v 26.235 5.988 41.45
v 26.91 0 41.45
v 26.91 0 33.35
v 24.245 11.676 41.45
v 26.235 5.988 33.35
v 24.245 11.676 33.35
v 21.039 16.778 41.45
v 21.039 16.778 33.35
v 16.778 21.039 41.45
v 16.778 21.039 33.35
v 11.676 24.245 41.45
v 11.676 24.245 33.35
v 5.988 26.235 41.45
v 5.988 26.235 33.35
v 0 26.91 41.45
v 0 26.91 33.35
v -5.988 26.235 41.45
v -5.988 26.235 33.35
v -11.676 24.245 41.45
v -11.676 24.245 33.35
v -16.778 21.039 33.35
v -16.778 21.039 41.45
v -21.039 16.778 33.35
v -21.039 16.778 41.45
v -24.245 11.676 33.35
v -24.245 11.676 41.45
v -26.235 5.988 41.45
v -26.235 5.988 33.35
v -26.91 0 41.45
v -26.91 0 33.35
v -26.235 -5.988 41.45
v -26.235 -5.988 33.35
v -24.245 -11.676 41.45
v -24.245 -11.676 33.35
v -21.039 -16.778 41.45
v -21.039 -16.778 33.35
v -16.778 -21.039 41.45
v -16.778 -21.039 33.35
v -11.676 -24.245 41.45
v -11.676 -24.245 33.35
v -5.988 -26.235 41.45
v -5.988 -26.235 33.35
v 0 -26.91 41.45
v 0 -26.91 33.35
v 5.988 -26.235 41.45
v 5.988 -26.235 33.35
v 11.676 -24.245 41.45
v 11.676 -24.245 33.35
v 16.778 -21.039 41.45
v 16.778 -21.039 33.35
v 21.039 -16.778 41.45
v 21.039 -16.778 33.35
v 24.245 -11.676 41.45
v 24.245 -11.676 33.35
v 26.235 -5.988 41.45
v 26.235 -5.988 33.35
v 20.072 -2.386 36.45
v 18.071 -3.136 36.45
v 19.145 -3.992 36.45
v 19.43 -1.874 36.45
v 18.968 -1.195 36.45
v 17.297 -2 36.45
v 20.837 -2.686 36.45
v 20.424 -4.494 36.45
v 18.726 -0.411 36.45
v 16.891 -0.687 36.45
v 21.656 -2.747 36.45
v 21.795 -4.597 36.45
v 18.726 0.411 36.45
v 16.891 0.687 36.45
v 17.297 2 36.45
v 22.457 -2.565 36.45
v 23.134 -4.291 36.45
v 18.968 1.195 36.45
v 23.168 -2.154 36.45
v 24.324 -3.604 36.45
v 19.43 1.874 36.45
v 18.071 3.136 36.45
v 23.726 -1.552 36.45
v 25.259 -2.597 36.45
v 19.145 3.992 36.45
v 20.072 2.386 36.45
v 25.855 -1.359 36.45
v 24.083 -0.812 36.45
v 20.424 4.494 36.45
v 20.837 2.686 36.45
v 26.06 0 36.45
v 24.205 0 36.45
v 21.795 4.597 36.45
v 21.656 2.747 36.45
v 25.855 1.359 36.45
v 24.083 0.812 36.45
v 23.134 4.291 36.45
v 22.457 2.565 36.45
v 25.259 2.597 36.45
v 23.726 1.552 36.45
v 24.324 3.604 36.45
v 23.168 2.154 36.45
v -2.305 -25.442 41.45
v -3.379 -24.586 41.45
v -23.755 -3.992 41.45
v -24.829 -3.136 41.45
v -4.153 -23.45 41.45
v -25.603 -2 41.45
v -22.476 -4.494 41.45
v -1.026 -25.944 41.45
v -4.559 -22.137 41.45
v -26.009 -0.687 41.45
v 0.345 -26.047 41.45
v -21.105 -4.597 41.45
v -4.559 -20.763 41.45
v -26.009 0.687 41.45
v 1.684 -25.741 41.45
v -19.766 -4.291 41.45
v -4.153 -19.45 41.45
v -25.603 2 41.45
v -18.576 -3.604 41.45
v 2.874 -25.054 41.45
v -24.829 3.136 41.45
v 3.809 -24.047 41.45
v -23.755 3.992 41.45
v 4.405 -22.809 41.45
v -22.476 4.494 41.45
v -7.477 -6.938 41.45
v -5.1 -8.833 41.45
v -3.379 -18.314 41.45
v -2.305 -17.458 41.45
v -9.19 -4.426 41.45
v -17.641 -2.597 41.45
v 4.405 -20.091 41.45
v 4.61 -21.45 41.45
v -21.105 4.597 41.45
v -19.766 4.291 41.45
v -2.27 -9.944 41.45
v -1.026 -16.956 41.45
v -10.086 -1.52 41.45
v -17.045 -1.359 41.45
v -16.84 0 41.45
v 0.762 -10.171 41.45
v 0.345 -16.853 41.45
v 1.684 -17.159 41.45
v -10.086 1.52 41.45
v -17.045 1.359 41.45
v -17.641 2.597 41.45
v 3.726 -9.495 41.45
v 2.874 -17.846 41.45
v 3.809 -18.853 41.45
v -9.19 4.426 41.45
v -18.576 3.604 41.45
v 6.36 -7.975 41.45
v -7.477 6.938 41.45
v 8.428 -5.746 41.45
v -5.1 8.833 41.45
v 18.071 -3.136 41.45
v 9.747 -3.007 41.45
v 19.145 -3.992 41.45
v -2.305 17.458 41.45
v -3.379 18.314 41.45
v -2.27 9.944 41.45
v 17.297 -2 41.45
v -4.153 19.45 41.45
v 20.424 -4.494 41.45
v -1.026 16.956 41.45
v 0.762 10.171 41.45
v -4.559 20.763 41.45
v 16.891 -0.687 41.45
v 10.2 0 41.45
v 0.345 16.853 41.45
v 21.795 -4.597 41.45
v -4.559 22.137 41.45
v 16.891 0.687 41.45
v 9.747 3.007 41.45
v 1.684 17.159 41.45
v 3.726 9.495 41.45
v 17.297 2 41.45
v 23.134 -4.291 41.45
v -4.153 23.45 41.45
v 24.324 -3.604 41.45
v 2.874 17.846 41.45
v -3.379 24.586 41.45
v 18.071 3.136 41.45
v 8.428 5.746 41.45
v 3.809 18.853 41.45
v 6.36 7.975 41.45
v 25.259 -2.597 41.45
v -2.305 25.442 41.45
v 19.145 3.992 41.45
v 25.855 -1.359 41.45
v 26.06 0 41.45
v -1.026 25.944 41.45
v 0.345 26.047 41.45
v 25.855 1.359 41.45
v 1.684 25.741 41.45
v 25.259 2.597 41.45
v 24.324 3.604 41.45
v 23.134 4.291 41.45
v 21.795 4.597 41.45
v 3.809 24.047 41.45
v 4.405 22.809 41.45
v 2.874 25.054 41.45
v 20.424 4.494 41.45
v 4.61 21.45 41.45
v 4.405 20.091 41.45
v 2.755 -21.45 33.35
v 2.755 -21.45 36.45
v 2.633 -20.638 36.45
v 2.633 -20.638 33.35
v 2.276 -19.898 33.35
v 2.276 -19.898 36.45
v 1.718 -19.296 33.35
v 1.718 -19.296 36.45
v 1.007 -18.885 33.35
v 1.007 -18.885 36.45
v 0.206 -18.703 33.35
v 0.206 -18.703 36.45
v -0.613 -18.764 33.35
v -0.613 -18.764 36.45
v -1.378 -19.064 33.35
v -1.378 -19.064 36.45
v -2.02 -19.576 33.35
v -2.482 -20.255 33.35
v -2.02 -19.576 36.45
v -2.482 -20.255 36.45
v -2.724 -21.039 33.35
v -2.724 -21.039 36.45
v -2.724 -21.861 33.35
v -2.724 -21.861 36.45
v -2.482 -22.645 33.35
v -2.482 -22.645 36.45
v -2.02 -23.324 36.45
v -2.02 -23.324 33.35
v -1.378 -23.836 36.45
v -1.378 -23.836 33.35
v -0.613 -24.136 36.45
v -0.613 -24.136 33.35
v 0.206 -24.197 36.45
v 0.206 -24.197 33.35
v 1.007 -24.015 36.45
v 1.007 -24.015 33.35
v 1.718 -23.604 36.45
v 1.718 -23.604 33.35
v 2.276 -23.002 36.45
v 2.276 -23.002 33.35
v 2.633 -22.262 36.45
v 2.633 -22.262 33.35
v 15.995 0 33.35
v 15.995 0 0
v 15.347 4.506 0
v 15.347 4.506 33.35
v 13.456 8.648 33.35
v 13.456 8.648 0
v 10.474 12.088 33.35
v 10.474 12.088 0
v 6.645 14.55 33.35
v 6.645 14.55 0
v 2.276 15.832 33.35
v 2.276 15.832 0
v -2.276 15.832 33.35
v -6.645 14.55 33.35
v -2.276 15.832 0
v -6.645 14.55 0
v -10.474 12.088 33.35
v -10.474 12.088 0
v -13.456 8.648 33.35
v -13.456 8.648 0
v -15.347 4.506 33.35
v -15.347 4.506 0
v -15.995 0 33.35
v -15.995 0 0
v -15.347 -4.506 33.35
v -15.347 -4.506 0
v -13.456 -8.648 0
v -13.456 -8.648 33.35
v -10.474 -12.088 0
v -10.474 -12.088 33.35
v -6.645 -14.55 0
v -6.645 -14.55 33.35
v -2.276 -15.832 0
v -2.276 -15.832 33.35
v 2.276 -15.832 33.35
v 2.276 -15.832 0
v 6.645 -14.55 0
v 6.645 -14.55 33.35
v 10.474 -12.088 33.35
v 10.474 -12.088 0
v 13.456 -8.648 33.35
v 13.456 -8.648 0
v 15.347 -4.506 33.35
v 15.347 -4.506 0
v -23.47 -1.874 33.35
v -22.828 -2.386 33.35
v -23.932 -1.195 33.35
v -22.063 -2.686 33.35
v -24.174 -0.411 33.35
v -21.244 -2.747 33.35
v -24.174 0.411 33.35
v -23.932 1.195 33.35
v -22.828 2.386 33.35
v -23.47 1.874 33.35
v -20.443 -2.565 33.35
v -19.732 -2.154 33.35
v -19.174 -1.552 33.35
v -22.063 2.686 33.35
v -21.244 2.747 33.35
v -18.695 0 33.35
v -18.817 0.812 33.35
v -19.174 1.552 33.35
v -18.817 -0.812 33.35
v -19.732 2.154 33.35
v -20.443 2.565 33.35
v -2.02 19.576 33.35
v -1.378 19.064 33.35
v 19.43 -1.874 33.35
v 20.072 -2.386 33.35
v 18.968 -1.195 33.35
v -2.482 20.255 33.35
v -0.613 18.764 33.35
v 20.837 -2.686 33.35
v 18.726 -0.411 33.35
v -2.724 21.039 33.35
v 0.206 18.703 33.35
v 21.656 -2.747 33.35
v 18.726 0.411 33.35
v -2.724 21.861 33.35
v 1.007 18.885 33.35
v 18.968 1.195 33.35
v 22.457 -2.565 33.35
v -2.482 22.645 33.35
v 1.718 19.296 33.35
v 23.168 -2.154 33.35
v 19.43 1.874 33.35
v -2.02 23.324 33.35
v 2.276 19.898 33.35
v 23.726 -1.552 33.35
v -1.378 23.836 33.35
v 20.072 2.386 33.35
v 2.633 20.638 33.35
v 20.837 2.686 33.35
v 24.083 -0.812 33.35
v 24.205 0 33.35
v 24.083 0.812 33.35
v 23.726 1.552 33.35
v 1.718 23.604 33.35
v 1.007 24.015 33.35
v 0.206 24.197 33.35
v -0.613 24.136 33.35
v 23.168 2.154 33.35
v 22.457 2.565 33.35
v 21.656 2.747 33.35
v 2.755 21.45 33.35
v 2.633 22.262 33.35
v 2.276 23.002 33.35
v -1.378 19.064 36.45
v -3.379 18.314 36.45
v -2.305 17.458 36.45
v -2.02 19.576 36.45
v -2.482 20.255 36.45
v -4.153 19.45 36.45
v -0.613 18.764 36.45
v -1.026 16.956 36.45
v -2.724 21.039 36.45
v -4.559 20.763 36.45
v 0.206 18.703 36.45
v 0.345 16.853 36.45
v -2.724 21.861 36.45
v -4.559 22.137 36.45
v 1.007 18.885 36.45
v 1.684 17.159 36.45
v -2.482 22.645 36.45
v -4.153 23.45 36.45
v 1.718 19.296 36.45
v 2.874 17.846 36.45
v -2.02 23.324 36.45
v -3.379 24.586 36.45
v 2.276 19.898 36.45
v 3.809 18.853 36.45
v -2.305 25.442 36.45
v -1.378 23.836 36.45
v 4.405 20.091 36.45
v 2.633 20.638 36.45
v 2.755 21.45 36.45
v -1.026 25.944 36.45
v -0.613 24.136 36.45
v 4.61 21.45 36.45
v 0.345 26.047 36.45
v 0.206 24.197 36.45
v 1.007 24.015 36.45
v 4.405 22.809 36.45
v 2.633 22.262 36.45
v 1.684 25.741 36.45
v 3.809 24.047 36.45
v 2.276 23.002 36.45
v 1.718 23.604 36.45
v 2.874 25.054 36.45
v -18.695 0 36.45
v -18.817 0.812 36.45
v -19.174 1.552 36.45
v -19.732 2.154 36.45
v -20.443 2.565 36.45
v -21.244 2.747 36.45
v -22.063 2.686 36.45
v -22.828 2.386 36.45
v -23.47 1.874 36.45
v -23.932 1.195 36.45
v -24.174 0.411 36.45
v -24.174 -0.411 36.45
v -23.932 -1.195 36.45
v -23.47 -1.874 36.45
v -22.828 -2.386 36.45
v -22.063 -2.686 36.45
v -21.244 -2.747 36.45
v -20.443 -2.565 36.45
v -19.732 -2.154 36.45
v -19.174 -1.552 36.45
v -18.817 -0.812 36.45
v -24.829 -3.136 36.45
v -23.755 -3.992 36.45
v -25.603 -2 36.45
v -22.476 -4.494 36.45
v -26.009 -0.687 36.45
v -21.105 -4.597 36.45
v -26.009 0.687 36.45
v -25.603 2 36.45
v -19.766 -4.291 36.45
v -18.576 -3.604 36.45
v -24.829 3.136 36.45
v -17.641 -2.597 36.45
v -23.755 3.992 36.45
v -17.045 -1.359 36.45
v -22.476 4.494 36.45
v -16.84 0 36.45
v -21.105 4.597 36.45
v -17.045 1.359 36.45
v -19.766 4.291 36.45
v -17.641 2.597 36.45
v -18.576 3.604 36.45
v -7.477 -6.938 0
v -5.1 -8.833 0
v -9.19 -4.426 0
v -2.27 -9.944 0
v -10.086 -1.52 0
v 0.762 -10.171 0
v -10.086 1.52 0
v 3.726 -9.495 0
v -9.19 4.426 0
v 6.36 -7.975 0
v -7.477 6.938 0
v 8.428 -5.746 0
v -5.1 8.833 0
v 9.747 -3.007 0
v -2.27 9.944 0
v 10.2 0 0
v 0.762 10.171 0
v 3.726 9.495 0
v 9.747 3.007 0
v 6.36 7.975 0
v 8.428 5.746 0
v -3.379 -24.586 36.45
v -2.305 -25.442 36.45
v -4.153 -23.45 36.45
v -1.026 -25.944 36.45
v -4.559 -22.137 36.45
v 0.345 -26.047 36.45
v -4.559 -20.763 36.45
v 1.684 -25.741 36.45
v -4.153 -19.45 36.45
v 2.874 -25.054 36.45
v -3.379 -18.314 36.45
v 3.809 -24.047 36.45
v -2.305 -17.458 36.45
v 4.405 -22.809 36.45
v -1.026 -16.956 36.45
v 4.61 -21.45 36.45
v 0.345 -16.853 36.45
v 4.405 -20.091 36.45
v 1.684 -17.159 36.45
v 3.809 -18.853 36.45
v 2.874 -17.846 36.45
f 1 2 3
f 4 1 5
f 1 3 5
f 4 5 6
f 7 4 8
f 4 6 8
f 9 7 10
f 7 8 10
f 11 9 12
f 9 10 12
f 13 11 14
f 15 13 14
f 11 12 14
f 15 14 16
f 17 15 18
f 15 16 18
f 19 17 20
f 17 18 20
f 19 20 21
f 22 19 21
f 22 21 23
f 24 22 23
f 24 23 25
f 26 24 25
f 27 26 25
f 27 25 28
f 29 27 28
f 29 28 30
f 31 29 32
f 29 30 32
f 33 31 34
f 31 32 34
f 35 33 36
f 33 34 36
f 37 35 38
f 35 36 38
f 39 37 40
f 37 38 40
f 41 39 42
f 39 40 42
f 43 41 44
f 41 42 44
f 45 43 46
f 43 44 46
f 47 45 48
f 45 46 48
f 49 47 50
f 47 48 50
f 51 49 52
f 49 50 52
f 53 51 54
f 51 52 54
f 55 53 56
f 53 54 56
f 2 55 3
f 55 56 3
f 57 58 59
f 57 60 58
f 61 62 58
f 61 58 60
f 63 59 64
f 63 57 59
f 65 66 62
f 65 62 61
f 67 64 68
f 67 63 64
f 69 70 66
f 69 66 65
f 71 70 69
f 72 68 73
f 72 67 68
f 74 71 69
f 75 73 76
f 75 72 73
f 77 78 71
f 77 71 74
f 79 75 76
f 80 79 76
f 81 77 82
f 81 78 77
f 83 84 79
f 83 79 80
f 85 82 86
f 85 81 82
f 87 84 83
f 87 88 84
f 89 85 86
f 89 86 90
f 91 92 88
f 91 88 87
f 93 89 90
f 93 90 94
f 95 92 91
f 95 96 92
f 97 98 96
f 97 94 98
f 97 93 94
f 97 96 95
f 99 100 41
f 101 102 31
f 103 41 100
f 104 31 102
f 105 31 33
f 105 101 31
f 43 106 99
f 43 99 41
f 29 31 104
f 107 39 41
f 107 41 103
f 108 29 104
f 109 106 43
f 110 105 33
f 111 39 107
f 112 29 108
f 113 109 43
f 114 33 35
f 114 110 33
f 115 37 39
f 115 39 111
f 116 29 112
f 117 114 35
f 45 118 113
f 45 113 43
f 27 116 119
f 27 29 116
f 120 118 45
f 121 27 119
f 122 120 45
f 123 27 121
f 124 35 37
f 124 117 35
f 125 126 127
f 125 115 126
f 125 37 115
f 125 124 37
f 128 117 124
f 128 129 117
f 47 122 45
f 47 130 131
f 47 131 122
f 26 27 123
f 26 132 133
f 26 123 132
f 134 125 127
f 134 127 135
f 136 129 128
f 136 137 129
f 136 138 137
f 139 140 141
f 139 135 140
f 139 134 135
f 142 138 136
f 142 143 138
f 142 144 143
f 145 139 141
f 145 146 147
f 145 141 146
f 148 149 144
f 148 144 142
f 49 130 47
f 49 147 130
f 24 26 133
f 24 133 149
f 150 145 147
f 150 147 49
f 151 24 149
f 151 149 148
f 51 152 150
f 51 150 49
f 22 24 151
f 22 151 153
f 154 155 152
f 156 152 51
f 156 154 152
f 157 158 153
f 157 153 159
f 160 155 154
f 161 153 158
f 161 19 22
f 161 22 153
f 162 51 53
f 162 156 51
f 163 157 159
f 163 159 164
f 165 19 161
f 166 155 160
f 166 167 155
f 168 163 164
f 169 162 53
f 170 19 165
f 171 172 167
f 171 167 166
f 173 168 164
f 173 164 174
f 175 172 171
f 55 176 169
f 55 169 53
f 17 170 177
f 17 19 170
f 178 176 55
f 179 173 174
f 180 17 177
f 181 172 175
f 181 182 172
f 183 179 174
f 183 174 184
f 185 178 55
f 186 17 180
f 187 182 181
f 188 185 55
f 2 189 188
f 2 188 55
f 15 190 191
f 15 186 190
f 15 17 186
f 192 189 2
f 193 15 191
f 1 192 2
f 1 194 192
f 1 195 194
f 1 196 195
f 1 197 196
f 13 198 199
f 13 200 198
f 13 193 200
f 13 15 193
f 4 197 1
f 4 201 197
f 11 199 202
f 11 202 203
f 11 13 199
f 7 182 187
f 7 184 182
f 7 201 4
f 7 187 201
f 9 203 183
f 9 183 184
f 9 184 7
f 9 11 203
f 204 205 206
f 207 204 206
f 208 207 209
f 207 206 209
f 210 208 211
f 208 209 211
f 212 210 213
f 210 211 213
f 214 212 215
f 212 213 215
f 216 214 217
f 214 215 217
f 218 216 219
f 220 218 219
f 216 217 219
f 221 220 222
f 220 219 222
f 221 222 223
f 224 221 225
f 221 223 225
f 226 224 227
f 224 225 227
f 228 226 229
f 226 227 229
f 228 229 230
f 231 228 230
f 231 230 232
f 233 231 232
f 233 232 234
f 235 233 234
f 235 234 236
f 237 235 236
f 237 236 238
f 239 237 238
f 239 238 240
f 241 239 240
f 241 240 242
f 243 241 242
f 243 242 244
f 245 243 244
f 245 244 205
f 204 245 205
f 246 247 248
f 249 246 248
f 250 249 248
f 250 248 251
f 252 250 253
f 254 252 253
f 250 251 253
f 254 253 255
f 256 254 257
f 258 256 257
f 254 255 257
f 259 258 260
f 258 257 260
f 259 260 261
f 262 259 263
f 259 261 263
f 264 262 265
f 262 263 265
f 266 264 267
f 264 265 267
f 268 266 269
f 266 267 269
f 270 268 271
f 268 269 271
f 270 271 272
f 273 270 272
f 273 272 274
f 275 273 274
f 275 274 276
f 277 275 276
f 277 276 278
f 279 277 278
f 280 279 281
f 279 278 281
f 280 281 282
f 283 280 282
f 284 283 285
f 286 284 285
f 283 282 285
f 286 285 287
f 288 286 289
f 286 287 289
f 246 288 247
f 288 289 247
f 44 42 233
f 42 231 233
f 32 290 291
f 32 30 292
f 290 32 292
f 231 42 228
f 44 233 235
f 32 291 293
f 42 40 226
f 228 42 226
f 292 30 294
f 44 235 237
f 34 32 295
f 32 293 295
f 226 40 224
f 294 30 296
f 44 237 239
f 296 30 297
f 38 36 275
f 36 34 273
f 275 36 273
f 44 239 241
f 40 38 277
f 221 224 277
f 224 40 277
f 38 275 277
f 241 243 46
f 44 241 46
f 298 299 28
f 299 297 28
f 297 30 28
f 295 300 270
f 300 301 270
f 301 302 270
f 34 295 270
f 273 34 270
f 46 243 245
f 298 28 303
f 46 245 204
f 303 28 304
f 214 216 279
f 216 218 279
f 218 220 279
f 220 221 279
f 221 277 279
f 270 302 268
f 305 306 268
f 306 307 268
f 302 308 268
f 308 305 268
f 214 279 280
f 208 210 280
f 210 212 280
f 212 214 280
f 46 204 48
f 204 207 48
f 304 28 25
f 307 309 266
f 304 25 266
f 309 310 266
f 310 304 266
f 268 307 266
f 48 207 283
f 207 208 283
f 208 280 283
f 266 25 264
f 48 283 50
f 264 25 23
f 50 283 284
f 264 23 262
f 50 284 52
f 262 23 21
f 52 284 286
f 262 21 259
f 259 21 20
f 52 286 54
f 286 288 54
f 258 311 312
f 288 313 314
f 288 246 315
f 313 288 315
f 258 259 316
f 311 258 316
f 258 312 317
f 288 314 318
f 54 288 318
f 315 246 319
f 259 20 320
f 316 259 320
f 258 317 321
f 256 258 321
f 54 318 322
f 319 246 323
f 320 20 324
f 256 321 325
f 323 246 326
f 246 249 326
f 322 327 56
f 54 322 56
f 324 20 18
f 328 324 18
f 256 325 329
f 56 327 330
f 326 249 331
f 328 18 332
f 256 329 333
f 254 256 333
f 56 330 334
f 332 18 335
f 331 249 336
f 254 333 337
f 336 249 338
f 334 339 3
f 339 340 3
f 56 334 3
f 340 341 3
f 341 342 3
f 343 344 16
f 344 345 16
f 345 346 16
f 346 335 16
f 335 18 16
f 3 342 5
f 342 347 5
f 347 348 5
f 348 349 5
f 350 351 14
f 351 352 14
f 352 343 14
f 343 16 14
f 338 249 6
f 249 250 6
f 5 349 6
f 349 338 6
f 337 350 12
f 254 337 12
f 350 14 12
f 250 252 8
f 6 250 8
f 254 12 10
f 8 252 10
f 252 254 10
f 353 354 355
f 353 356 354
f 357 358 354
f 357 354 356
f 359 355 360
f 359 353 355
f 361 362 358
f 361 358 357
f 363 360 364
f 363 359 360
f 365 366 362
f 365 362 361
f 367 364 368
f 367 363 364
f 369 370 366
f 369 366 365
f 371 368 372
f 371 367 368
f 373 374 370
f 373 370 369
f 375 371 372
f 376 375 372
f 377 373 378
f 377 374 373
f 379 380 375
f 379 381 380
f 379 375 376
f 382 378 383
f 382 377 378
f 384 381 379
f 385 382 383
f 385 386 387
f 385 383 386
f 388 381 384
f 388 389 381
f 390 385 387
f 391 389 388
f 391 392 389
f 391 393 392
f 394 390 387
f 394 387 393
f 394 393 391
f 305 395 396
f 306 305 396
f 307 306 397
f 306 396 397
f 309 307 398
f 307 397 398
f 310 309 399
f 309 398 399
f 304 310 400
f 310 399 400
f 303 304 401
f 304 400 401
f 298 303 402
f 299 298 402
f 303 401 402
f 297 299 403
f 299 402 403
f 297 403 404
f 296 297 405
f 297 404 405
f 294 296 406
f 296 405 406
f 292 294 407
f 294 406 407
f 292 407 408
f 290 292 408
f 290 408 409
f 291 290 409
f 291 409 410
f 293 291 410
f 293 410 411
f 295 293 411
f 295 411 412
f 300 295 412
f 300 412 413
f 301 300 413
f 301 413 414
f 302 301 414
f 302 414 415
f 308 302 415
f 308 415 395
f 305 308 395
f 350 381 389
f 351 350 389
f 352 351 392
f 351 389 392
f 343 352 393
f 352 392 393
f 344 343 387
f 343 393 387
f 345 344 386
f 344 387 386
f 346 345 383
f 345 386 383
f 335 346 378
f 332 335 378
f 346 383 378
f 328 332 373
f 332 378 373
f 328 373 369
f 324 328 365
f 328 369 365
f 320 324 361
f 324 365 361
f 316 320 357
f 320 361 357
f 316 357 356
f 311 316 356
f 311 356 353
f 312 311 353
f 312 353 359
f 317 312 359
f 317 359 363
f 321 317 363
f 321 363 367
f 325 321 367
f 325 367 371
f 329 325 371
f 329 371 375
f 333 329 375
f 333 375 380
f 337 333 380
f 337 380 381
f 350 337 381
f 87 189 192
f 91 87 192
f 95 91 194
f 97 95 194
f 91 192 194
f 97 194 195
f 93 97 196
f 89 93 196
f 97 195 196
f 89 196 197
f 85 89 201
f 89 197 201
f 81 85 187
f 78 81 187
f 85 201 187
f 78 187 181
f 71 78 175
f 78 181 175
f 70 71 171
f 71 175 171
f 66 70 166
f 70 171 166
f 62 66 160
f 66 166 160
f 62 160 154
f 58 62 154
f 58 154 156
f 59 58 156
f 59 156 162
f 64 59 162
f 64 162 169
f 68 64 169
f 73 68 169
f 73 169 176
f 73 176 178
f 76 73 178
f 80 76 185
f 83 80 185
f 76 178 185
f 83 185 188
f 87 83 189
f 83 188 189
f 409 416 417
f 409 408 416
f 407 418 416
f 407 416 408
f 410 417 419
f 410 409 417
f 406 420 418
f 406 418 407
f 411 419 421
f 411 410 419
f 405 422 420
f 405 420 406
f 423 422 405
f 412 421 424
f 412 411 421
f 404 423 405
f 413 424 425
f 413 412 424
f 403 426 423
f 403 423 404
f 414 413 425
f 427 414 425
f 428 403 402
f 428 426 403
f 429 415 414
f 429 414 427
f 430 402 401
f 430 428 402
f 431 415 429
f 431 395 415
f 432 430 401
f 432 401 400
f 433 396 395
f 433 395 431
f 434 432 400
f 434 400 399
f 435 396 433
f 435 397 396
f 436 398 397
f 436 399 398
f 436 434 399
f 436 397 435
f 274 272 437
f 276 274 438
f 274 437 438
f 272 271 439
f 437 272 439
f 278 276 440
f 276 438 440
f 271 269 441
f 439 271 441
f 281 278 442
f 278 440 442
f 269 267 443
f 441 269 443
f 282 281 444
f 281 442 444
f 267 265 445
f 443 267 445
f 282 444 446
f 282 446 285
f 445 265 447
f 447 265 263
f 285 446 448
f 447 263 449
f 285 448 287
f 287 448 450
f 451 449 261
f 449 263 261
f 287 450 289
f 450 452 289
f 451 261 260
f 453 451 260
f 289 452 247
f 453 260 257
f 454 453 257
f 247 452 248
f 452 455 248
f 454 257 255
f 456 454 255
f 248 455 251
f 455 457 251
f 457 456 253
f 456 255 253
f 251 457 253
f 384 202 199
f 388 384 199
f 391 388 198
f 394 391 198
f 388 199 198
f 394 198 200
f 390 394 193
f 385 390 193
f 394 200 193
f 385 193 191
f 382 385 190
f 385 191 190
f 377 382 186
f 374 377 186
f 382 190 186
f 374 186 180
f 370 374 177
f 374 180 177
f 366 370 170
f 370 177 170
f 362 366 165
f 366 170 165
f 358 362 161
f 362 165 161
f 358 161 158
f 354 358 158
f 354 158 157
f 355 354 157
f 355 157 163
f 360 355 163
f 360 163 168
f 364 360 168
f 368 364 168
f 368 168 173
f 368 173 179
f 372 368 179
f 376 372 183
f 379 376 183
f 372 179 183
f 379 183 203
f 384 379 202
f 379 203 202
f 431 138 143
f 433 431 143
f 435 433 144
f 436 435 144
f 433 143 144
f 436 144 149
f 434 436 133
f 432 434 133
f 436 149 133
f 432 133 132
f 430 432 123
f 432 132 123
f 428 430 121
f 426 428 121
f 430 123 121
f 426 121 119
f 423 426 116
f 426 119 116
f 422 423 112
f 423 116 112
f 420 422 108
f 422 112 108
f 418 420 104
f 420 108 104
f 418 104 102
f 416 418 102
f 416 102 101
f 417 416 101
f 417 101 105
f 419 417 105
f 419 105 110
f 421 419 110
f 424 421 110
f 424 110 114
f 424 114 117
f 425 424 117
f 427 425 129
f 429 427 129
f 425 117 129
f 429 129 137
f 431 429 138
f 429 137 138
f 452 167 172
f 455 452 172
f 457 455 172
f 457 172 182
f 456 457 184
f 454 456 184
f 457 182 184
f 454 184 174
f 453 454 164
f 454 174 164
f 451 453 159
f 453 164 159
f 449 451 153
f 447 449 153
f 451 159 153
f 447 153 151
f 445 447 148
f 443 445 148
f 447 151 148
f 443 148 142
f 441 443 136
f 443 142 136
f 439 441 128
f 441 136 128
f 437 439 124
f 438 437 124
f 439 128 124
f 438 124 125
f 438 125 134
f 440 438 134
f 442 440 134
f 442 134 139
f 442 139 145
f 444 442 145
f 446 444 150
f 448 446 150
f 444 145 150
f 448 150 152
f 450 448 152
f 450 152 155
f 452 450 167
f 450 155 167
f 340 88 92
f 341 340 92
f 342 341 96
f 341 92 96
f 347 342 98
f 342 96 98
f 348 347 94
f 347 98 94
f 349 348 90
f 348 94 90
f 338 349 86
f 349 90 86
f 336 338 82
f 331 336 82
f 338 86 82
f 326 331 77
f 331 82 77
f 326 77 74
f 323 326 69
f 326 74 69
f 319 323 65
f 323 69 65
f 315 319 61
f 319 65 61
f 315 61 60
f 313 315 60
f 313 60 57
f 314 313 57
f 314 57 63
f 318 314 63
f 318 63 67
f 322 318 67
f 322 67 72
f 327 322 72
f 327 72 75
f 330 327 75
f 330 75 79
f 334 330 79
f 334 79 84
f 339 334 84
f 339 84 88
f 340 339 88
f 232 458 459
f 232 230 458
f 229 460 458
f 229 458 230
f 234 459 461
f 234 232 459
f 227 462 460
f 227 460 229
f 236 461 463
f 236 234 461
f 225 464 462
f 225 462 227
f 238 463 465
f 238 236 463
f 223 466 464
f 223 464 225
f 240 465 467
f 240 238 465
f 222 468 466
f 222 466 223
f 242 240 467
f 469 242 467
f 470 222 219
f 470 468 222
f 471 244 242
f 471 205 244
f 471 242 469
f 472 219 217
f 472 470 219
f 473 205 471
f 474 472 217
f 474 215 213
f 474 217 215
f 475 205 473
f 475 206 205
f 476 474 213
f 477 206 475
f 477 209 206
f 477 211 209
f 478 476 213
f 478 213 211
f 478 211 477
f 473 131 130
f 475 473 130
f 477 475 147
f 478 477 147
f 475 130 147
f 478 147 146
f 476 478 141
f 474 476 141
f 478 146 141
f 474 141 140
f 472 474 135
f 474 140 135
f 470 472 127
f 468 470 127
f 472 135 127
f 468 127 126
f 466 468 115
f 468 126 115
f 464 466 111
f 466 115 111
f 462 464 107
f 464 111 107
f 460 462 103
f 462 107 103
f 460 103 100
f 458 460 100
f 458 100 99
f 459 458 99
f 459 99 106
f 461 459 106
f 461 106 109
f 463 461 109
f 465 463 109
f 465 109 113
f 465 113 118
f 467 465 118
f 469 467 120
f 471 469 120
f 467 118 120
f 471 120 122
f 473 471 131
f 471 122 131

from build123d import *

# Parameters (mm, degrees)
ESBO_O1_R                = 15.995
RESSALTO_EXTRUS_O1_DEPTH = 33.35
ESBO_O2_R                = 26.91
RESSALTO_EXTRUS_O2_DEPTH = 8.1
ESBO_O3_R                = 4.61
CORTE_EXTRUS_O1_DEPTH    = 5
ESBO_O4_R                = 2.755
CORTE_EXTRUS_O2_DEPTH    = 8.1
ESBO_O5_R                = 10.2
CORTE_EXTRUS_O3_DEPTH    = 41.45


with BuildPart() as part:
    # Esboço1 → Ressalto-extrusão1 (new body)
    with BuildSketch(Plane.XY):
        Circle(ESBO_O1_R)
    extrude(amount=RESSALTO_EXTRUS_O1_DEPTH)

    # Esboço2 → Ressalto-extrusão2 (add)
    with BuildSketch(Plane.XY.offset(33.35)):
        Circle(ESBO_O2_R)
    extrude(amount=RESSALTO_EXTRUS_O2_DEPTH)

    # Esboço3 → Corte-extrusão1 (cut)
    with BuildSketch(Plane.XY.offset(41.45)):
        with Locations((21.45, 0)):
            Circle(ESBO_O3_R)
        with Locations((0, -21.45)):
            Circle(ESBO_O3_R)
        with Locations((-21.45, 0)):
            Circle(ESBO_O3_R)
        with Locations((0, 21.45)):
            Circle(ESBO_O3_R)
    extrude(amount=-CORTE_EXTRUS_O1_DEPTH, mode=Mode.SUBTRACT)

    # Esboço4 → Corte-extrusão2 (cut)
    with BuildSketch(Plane.XY.offset(41.45)):
        with Locations((21.45, 0)):
            Circle(ESBO_O4_R)
        with Locations((0, -21.45)):
            Circle(ESBO_O4_R)
        with Locations((-21.45, 0)):
            Circle(ESBO_O4_R)
        with Locations((0, 21.45)):
            Circle(ESBO_O4_R)
    extrude(amount=-CORTE_EXTRUS_O2_DEPTH, mode=Mode.SUBTRACT)

    # Esboço5 → Corte-extrusão3 (cut)
    with BuildSketch(Plane.XY.offset(41.45)):
        Circle(ESBO_O5_R)
    extrude(amount=-CORTE_EXTRUS_O3_DEPTH, mode=Mode.SUBTRACT)


solid = part.part
